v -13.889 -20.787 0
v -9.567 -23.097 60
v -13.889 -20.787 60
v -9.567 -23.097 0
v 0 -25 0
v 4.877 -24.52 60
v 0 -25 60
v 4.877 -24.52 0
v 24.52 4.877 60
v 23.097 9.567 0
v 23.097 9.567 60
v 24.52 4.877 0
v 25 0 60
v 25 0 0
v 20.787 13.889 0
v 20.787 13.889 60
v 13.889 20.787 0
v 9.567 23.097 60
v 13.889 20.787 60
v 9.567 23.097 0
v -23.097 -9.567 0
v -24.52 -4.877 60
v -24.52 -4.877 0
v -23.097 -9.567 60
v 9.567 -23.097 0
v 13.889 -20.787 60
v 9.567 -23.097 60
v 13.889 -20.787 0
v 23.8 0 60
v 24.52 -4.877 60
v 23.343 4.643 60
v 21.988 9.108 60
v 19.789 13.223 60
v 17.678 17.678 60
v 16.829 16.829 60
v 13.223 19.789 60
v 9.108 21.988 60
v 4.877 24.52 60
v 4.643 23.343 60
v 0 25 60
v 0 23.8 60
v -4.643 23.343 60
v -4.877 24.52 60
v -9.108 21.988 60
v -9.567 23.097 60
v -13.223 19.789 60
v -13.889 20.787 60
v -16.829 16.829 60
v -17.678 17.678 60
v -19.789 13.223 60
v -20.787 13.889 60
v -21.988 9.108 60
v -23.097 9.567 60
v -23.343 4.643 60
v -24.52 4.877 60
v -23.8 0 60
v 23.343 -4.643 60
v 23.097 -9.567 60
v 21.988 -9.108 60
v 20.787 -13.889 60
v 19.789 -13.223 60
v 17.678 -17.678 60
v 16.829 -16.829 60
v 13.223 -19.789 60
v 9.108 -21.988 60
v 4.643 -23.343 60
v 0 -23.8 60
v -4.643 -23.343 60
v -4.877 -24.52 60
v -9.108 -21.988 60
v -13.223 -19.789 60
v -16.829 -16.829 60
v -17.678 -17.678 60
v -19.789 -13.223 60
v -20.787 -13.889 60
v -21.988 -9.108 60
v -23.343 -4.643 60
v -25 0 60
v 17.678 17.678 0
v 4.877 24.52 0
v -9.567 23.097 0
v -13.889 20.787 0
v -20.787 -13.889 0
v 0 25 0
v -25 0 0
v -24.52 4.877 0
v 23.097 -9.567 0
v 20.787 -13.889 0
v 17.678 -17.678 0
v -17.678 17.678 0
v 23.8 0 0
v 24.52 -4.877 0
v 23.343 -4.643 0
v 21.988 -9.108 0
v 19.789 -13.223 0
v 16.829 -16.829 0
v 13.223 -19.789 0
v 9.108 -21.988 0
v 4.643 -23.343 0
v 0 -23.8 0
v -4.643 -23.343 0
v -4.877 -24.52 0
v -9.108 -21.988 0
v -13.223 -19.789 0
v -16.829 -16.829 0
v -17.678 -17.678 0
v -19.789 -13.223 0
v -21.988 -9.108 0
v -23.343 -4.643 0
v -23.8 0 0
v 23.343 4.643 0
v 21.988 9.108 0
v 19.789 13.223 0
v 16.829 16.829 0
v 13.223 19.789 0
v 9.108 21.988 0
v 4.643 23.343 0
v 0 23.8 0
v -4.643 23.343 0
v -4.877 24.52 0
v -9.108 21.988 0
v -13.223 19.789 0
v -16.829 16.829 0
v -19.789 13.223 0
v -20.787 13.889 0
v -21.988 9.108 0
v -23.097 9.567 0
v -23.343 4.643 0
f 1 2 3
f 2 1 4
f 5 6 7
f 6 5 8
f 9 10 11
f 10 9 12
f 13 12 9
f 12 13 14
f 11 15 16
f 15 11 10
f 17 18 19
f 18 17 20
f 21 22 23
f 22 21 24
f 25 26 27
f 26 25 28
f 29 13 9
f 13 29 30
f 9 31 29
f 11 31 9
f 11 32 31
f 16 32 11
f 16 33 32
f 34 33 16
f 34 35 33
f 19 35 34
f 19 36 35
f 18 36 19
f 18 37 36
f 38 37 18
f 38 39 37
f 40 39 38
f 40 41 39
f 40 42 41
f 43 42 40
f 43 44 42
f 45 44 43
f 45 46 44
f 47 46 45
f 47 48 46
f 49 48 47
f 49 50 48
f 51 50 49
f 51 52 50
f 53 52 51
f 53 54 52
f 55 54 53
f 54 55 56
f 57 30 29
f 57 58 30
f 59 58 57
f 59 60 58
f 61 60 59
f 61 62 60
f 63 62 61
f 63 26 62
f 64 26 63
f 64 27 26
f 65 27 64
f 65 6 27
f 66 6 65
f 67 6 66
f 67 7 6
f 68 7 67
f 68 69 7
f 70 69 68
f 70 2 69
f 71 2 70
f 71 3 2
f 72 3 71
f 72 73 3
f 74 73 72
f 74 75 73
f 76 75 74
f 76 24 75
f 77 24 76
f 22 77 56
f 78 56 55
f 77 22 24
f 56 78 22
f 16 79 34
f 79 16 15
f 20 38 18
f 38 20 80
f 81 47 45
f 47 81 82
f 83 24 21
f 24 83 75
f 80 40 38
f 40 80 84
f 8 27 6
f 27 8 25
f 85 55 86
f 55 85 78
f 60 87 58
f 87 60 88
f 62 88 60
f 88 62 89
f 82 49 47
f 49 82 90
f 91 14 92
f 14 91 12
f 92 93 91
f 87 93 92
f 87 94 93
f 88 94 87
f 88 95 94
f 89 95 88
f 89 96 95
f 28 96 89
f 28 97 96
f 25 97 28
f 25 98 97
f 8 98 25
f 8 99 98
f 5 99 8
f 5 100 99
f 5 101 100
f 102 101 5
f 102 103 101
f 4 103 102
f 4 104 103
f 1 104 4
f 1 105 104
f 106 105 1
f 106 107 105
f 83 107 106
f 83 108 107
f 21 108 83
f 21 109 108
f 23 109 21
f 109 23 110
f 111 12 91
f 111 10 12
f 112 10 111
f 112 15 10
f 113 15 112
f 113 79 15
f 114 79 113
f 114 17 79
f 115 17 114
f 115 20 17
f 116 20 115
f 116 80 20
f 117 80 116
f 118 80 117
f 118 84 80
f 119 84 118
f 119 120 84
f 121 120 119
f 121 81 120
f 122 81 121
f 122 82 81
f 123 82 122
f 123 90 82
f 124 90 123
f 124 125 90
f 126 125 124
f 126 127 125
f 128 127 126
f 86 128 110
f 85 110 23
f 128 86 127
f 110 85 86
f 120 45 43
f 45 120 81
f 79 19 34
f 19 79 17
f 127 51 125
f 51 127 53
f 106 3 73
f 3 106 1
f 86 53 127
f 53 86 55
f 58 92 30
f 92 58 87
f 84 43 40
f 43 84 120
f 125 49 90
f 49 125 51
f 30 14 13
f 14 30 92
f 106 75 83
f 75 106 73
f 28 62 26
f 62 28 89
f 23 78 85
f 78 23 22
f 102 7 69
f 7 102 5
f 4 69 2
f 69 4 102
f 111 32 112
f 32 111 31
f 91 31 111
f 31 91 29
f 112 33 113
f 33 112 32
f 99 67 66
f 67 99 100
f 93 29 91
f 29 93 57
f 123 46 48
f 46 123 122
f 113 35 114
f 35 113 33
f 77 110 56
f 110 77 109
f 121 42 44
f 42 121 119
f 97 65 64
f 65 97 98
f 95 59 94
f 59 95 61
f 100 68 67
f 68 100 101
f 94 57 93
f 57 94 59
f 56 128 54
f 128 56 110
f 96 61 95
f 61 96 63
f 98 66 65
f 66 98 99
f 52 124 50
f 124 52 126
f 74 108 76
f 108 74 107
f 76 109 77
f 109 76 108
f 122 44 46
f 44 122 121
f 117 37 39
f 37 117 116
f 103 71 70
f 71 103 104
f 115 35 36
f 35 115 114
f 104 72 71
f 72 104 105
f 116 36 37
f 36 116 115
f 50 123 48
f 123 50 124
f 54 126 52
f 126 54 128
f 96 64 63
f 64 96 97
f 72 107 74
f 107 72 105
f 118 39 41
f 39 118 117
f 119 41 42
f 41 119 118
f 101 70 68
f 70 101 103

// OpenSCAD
$fn = 32;

// ----------------------------------------------------------------------
// Thin tube: 1.2 mm wall
// ----------------------------------------------------------------------

// --- parameters (mm) ---
tube_od = 50;             // outer diameter
tube_h = 60;              // height, Z
wall = 1.2;               // wall thickness

difference() {
  cylinder(h = tube_h, d = tube_od);
  translate([0, 0, -1]) cylinder(h = tube_h + 2, d = tube_od - 2 * wall);
}
